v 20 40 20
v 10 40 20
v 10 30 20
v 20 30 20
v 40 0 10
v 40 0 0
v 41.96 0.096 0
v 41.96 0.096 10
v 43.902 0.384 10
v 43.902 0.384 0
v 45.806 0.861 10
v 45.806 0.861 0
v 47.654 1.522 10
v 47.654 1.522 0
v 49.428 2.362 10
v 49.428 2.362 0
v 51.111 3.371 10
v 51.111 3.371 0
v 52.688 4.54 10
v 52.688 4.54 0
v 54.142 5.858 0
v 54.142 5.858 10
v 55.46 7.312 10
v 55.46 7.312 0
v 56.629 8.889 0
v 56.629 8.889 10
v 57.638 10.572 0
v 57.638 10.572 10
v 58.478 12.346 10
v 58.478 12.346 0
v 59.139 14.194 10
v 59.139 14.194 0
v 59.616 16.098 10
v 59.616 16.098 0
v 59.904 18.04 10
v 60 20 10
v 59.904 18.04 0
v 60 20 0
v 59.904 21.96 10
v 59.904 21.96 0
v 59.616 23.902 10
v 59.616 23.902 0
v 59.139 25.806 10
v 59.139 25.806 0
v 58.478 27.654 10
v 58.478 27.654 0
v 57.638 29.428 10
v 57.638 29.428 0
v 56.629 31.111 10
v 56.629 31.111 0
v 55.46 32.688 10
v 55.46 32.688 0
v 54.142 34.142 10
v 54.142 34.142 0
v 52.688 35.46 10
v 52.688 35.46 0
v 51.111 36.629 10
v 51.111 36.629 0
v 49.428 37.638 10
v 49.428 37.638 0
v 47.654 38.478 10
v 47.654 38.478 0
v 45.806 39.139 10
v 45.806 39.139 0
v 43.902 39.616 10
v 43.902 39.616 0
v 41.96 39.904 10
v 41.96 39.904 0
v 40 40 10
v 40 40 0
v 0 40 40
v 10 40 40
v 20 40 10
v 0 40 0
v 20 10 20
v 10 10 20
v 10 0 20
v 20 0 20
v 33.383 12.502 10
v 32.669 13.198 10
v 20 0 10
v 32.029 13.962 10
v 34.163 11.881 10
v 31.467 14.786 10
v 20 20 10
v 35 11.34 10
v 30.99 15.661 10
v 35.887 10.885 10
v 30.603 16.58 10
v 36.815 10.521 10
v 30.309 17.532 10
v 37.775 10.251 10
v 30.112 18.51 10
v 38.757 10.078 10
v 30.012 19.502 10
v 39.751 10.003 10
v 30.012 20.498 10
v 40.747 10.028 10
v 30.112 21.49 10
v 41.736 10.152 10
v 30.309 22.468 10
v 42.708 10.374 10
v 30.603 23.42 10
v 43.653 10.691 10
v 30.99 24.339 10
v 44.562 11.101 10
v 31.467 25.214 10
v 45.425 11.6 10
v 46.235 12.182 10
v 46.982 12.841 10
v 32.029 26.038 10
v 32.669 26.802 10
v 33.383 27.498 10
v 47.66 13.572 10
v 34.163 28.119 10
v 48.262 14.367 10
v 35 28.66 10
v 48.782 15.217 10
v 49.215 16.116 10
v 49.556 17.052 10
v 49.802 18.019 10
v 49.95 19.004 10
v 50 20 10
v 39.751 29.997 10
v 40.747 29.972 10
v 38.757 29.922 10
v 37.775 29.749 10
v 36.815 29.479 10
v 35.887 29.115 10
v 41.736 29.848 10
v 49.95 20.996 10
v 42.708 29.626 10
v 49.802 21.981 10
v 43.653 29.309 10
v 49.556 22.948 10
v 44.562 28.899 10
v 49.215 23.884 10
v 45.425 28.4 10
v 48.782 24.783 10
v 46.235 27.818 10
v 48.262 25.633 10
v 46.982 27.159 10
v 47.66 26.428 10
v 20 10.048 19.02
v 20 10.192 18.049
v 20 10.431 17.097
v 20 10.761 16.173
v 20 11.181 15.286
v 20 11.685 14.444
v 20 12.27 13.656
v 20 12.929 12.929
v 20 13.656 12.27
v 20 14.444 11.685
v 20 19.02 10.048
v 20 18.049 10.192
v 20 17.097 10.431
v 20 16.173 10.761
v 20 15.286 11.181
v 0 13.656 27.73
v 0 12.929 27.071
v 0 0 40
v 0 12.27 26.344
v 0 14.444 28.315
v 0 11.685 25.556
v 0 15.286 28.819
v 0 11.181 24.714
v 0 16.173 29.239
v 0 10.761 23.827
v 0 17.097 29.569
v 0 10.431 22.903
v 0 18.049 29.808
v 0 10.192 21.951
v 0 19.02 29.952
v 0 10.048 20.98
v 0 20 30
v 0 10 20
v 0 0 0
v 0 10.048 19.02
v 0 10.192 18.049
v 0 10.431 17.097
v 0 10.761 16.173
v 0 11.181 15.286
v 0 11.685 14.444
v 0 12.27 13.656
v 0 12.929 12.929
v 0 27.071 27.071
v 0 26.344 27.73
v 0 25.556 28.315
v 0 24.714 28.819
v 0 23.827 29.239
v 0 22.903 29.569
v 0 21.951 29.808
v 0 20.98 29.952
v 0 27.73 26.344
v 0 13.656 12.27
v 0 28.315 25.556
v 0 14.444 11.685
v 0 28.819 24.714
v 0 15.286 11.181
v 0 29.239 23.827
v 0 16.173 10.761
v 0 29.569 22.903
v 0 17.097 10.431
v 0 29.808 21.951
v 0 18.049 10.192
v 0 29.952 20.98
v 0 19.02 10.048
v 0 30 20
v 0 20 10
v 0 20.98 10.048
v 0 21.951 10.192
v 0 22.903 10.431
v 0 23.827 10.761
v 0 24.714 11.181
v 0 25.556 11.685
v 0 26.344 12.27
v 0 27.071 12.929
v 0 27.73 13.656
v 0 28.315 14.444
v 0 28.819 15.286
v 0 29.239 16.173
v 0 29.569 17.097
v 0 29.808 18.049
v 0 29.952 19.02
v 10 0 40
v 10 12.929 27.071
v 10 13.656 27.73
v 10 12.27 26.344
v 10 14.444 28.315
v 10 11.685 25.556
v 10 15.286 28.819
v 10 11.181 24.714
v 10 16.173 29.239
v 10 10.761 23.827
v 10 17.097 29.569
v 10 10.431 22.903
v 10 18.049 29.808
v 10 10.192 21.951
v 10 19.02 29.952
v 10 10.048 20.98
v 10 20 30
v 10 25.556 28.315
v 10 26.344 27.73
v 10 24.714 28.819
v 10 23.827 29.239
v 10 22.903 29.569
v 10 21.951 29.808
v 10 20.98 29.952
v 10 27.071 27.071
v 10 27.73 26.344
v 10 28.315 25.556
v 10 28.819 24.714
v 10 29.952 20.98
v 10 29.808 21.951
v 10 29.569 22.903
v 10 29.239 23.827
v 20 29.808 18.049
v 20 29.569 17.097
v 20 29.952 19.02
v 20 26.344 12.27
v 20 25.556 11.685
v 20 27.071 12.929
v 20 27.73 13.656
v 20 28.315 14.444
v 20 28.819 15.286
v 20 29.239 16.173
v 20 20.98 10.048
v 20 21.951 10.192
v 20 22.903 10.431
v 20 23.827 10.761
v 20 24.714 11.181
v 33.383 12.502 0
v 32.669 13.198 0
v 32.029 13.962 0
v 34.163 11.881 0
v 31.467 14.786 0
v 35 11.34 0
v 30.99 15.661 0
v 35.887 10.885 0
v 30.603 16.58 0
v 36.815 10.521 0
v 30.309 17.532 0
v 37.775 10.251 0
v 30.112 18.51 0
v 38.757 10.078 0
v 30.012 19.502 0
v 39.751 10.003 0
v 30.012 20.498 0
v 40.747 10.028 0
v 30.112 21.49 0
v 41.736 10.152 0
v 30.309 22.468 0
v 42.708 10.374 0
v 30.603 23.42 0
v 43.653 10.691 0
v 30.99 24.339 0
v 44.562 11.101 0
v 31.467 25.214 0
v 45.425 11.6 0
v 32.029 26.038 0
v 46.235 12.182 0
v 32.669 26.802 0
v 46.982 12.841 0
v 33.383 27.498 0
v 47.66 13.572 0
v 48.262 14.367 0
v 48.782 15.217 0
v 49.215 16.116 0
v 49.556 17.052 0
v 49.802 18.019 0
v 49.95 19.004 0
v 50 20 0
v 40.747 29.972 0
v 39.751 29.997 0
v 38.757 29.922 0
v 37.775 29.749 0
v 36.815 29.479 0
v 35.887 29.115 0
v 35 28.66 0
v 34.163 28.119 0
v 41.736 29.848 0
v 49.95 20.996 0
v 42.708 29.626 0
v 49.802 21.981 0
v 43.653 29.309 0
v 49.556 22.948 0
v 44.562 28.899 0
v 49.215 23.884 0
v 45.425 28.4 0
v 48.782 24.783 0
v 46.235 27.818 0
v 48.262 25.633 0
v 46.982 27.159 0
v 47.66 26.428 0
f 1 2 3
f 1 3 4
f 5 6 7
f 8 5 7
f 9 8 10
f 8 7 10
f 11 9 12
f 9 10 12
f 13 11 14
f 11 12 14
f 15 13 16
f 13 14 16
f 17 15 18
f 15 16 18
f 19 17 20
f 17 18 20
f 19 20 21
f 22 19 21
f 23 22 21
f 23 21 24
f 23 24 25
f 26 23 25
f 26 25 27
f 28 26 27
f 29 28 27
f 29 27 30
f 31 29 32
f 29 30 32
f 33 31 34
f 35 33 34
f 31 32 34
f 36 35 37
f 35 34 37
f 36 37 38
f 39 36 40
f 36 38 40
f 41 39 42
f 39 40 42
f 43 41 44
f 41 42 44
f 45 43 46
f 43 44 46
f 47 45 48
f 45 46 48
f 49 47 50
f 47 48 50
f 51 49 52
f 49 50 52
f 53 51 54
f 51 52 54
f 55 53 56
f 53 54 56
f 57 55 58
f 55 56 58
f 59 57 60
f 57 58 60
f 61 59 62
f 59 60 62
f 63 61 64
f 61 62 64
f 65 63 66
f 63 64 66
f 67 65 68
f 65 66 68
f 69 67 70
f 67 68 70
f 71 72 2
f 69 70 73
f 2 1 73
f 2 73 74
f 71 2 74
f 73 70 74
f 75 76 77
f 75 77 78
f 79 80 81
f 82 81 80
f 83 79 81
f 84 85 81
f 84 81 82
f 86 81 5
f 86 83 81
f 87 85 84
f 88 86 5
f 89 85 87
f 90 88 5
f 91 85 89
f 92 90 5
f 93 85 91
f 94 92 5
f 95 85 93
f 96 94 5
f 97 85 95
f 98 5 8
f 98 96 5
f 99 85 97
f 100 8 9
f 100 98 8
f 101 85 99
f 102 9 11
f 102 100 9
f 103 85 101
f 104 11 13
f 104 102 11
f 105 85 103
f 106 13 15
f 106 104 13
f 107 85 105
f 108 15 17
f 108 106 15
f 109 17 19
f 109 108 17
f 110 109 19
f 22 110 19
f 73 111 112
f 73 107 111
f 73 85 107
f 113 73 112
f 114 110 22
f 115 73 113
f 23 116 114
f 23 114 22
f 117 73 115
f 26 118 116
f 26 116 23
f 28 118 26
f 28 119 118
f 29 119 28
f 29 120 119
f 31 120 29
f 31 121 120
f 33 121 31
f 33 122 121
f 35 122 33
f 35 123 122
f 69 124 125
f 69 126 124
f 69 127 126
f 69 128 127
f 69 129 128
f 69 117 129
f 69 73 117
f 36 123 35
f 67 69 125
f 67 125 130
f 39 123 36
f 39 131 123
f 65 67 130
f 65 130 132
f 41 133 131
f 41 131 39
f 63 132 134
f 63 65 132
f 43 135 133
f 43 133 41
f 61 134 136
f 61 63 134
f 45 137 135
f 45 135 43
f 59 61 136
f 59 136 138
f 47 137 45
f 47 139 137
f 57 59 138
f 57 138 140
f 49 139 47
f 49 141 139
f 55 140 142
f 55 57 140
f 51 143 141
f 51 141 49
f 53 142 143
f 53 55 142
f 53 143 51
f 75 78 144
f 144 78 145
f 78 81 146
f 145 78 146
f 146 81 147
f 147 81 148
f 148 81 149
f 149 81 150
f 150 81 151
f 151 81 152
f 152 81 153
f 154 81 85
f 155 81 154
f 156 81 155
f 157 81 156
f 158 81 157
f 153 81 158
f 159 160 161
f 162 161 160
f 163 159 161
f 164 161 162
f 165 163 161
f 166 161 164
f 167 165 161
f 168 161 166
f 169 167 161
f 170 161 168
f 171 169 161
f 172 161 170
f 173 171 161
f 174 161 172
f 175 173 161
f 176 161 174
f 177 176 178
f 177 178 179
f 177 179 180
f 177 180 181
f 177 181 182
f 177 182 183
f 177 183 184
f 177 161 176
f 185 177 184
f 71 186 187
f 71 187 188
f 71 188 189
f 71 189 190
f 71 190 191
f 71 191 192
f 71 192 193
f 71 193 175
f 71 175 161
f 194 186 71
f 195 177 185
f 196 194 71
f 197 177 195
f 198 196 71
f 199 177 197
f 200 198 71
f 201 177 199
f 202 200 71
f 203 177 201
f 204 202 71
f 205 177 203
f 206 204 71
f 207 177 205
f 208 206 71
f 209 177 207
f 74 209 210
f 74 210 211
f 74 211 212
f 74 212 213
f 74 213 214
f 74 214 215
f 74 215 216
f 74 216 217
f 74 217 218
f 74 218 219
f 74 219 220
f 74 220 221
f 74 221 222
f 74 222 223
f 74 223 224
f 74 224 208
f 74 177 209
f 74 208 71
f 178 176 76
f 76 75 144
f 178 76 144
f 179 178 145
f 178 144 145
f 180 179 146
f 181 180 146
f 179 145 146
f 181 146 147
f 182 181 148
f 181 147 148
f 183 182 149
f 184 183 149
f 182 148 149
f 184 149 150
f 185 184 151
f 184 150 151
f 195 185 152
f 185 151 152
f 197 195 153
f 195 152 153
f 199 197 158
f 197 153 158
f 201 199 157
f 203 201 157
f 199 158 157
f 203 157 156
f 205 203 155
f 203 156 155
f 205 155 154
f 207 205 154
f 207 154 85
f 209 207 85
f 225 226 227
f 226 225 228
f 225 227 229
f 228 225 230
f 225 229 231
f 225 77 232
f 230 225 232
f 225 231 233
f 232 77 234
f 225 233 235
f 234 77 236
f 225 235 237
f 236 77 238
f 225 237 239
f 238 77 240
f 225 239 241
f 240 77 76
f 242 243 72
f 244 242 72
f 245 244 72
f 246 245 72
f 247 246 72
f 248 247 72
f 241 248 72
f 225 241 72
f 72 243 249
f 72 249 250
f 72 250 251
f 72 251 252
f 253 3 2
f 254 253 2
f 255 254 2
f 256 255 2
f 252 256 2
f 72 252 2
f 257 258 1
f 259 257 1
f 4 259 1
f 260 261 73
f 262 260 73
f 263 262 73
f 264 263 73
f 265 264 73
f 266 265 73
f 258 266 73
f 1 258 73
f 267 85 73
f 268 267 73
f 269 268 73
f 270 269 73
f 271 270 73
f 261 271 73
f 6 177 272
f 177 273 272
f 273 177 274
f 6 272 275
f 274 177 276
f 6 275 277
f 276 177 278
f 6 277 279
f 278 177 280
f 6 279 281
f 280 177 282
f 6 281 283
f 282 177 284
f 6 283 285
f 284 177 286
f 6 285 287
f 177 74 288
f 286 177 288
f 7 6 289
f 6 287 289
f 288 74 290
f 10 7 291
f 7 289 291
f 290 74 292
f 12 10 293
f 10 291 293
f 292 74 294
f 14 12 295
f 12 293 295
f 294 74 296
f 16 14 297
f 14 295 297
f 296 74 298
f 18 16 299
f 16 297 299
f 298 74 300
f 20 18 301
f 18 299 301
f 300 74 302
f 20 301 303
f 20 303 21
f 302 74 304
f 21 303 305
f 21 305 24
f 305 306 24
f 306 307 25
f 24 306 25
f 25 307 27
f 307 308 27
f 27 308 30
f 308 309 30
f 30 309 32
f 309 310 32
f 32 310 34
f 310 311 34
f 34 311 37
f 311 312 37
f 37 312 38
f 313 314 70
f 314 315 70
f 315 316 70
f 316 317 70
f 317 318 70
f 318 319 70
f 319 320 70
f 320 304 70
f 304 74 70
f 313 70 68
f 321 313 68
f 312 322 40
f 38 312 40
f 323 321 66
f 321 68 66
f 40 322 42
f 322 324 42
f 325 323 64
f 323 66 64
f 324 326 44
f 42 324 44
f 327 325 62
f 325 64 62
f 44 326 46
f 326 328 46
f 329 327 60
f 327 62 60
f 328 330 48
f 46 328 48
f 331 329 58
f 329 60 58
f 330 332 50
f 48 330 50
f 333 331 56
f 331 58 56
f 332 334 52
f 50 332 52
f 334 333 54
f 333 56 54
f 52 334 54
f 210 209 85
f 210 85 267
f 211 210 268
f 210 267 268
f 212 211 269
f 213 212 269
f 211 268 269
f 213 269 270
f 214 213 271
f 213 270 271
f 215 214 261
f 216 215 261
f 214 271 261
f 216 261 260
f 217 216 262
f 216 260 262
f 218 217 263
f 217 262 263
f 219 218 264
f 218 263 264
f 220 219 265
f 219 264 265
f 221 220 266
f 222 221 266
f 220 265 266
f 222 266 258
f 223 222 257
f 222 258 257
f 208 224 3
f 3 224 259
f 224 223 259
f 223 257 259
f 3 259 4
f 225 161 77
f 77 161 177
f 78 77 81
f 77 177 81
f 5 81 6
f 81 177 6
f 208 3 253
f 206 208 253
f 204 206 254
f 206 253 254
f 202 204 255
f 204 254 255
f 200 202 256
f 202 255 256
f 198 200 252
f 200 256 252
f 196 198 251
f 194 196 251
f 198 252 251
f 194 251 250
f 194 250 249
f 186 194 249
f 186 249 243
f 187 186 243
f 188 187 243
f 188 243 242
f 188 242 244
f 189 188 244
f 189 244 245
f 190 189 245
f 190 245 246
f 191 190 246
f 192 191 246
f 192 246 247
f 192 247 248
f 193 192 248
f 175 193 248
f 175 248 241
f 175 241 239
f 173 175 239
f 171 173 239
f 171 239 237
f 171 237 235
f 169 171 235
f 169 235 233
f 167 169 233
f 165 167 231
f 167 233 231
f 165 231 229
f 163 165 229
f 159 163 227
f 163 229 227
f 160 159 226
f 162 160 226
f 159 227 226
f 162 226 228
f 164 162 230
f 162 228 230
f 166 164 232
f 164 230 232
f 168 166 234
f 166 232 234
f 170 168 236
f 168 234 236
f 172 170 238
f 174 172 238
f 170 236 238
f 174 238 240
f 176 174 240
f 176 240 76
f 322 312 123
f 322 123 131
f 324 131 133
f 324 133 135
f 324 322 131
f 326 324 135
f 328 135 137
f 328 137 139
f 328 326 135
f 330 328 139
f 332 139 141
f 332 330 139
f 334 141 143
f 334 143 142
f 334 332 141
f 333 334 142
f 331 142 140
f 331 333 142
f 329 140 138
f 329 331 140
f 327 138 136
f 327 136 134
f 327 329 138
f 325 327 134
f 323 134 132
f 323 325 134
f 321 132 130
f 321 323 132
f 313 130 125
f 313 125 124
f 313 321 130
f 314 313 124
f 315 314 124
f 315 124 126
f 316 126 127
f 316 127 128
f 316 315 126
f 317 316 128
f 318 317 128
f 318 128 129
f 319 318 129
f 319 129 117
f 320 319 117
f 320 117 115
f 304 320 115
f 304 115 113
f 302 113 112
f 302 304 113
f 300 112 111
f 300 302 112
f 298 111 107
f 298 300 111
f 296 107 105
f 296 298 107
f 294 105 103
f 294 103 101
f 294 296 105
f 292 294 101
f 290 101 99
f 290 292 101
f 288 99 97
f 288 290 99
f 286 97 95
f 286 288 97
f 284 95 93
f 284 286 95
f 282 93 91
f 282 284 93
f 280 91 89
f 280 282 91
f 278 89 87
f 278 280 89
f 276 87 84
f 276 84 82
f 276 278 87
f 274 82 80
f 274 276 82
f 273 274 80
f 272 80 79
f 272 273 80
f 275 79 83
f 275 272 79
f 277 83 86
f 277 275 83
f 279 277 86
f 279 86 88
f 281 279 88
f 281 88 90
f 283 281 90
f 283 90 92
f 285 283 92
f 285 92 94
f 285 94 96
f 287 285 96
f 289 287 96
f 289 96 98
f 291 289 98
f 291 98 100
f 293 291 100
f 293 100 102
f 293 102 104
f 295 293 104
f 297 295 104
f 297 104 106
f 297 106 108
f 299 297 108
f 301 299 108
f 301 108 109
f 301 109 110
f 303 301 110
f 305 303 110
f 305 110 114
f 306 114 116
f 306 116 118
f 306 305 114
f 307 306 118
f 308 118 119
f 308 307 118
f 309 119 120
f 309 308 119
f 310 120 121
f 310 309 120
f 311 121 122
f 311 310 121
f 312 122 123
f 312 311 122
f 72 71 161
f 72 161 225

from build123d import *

# Parameters (mm, degrees)
F0_W     = 10
F0_H     = 40
F1_DEPTH = 40
F2_DEPTH = 20
F0_R     = 10
F3_DEPTH = 10
F5_DEPTH = 20.001


with BuildPart() as f1:
    # F0 (on Top) → F1 (new body)
    with BuildSketch(Plane.XY):
        with Locations((5, 20)):
            Rectangle(F0_W, F0_H)
    extrude(amount=F1_DEPTH)

    # F0 (on Top) → F2 (join)
    with BuildSketch(Plane.XY):
        with Locations((15, 20)):
            Rectangle(F0_W, F0_H)
    extrude(amount=F2_DEPTH)

    # F0 (on Top) → F3 (join)
    with BuildSketch(Plane.XY):
        with BuildLine():
            Line((20, 40), (20, 0))
            Line((20, 0), (40, 0))
            ThreePointArc((40, 0), (60, 20), (40, 40))
            Line((40, 40), (20, 40))
        make_face()
        with Locations((40, 20)):
            Circle(F0_R, mode=Mode.SUBTRACT)
    extrude(amount=F3_DEPTH)

    # F4 (on face) → F5 (cut, through all)
    with BuildSketch(Plane.YZ.offset(20)):
        with BuildLine():
            ThreePointArc((20, 10), (27.071068, 12.928932), (30, 20))
            Line((30, 20), (10, 20))
            ThreePointArc((10, 20), (12.928932, 12.928932), (20, 10))
        make_face()
        with BuildLine():
            Line((10, 20), (30, 20))
            ThreePointArc((30, 20), (20, 30), (10, 20))
        make_face()
    extrude(amount=-F5_DEPTH, mode=Mode.SUBTRACT)


solid = f1.part
